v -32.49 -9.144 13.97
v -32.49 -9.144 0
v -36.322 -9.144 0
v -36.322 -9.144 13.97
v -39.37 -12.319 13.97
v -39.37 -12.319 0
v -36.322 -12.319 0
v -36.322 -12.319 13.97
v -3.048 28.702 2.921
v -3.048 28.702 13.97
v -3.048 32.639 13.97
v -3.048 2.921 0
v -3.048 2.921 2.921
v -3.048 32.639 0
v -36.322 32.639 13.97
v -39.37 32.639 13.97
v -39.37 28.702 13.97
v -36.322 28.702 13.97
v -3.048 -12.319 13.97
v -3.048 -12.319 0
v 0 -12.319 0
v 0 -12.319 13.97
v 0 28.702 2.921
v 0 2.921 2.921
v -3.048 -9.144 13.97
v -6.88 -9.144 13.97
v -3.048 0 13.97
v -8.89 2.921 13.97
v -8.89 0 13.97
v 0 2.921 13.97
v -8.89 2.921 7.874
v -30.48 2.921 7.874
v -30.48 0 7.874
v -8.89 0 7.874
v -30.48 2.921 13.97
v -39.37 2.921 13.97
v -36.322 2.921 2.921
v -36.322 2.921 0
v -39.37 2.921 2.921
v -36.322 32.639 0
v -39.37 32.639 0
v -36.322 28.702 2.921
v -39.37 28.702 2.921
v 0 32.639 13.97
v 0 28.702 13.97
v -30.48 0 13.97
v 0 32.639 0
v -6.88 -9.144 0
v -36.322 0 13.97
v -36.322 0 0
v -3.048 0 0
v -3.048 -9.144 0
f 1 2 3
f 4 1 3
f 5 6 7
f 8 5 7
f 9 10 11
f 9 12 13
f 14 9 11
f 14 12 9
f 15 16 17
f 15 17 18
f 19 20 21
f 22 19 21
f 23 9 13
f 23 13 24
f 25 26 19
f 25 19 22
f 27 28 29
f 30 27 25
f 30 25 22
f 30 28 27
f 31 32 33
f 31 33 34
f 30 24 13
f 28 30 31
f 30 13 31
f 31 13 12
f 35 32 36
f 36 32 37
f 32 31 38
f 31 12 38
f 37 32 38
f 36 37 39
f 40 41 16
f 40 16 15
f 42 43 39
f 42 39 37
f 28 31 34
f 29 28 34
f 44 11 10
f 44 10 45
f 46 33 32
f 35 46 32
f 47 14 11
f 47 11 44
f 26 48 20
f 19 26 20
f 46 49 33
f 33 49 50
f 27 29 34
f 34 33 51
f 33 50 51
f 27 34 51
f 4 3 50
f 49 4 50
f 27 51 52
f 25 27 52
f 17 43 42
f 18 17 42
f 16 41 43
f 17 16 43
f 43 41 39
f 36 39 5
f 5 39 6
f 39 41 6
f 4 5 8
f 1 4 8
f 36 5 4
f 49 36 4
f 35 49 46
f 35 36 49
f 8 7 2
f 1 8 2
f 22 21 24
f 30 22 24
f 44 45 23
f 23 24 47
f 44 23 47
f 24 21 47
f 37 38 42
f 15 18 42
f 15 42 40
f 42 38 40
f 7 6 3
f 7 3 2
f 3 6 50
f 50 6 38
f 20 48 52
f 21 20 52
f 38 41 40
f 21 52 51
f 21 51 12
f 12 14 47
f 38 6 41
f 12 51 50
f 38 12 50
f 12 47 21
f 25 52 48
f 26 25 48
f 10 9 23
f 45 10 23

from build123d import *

# Parameters (mm, degrees)
F0_W     = 10.795
F0_H     = 2.921
F1_DEPTH = 7.874
F2_DEPTH = 13.97
F0_W_2   = 3.048
F0_H_2   = 25.781
F3_DEPTH = 2.921
F0_H_3   = 3.937
F4_DEPTH = 13.97


with BuildPart() as f1:
    # F0 (on Top) → F1 (new body)
    with BuildSketch(Plane.XY):
        with Locations((-25.0825, 1.4605)):
            Rectangle(F0_W, F0_H)
        with Locations((-14.2875, 1.4605)):
            Rectangle(F0_W, F0_H)
    extrude(amount=F1_DEPTH)

    # F0 (on Top) → F2 (join)
    with BuildSketch(Plane.XY):
        Polygon((0, 2.921), (-3.048, 2.921), (-8.89, 2.921), (-8.89, 0), (-3.048, 0), (-3.048, -9.144), (-6.880294, -9.144), (-3.048, -12.319), (0, -12.319), (0, -9.144), align=None)
        Polygon((-30.48, 0), (-30.48, 2.921), (-36.322, 2.921), (-39.37, 2.921), (-39.37, -9.144), (-39.37, -12.319), (-36.322, -12.319), (-32.489706, -9.144), (-36.322, -9.144), (-36.322, 0), align=None)
    extrude(amount=F2_DEPTH)

    # F0 (on Top) → F3 (join)
    with BuildSketch(Plane.XY):
        with Locations((-1.524, 15.8115)):
            Rectangle(F0_W_2, F0_H_2)
        with Locations((-37.846, 15.8115)):
            Rectangle(F0_W_2, F0_H_2)
    extrude(amount=F3_DEPTH)

    # F0 (on Top) → F4 (join)
    with BuildSketch(Plane.XY):
        with Locations((-1.524, 30.6705)):
            Rectangle(F0_W_2, F0_H_3)
        with Locations((-37.846, 30.6705)):
            Rectangle(F0_W_2, F0_H_3)
    extrude(amount=F4_DEPTH)


solid = f1.part
